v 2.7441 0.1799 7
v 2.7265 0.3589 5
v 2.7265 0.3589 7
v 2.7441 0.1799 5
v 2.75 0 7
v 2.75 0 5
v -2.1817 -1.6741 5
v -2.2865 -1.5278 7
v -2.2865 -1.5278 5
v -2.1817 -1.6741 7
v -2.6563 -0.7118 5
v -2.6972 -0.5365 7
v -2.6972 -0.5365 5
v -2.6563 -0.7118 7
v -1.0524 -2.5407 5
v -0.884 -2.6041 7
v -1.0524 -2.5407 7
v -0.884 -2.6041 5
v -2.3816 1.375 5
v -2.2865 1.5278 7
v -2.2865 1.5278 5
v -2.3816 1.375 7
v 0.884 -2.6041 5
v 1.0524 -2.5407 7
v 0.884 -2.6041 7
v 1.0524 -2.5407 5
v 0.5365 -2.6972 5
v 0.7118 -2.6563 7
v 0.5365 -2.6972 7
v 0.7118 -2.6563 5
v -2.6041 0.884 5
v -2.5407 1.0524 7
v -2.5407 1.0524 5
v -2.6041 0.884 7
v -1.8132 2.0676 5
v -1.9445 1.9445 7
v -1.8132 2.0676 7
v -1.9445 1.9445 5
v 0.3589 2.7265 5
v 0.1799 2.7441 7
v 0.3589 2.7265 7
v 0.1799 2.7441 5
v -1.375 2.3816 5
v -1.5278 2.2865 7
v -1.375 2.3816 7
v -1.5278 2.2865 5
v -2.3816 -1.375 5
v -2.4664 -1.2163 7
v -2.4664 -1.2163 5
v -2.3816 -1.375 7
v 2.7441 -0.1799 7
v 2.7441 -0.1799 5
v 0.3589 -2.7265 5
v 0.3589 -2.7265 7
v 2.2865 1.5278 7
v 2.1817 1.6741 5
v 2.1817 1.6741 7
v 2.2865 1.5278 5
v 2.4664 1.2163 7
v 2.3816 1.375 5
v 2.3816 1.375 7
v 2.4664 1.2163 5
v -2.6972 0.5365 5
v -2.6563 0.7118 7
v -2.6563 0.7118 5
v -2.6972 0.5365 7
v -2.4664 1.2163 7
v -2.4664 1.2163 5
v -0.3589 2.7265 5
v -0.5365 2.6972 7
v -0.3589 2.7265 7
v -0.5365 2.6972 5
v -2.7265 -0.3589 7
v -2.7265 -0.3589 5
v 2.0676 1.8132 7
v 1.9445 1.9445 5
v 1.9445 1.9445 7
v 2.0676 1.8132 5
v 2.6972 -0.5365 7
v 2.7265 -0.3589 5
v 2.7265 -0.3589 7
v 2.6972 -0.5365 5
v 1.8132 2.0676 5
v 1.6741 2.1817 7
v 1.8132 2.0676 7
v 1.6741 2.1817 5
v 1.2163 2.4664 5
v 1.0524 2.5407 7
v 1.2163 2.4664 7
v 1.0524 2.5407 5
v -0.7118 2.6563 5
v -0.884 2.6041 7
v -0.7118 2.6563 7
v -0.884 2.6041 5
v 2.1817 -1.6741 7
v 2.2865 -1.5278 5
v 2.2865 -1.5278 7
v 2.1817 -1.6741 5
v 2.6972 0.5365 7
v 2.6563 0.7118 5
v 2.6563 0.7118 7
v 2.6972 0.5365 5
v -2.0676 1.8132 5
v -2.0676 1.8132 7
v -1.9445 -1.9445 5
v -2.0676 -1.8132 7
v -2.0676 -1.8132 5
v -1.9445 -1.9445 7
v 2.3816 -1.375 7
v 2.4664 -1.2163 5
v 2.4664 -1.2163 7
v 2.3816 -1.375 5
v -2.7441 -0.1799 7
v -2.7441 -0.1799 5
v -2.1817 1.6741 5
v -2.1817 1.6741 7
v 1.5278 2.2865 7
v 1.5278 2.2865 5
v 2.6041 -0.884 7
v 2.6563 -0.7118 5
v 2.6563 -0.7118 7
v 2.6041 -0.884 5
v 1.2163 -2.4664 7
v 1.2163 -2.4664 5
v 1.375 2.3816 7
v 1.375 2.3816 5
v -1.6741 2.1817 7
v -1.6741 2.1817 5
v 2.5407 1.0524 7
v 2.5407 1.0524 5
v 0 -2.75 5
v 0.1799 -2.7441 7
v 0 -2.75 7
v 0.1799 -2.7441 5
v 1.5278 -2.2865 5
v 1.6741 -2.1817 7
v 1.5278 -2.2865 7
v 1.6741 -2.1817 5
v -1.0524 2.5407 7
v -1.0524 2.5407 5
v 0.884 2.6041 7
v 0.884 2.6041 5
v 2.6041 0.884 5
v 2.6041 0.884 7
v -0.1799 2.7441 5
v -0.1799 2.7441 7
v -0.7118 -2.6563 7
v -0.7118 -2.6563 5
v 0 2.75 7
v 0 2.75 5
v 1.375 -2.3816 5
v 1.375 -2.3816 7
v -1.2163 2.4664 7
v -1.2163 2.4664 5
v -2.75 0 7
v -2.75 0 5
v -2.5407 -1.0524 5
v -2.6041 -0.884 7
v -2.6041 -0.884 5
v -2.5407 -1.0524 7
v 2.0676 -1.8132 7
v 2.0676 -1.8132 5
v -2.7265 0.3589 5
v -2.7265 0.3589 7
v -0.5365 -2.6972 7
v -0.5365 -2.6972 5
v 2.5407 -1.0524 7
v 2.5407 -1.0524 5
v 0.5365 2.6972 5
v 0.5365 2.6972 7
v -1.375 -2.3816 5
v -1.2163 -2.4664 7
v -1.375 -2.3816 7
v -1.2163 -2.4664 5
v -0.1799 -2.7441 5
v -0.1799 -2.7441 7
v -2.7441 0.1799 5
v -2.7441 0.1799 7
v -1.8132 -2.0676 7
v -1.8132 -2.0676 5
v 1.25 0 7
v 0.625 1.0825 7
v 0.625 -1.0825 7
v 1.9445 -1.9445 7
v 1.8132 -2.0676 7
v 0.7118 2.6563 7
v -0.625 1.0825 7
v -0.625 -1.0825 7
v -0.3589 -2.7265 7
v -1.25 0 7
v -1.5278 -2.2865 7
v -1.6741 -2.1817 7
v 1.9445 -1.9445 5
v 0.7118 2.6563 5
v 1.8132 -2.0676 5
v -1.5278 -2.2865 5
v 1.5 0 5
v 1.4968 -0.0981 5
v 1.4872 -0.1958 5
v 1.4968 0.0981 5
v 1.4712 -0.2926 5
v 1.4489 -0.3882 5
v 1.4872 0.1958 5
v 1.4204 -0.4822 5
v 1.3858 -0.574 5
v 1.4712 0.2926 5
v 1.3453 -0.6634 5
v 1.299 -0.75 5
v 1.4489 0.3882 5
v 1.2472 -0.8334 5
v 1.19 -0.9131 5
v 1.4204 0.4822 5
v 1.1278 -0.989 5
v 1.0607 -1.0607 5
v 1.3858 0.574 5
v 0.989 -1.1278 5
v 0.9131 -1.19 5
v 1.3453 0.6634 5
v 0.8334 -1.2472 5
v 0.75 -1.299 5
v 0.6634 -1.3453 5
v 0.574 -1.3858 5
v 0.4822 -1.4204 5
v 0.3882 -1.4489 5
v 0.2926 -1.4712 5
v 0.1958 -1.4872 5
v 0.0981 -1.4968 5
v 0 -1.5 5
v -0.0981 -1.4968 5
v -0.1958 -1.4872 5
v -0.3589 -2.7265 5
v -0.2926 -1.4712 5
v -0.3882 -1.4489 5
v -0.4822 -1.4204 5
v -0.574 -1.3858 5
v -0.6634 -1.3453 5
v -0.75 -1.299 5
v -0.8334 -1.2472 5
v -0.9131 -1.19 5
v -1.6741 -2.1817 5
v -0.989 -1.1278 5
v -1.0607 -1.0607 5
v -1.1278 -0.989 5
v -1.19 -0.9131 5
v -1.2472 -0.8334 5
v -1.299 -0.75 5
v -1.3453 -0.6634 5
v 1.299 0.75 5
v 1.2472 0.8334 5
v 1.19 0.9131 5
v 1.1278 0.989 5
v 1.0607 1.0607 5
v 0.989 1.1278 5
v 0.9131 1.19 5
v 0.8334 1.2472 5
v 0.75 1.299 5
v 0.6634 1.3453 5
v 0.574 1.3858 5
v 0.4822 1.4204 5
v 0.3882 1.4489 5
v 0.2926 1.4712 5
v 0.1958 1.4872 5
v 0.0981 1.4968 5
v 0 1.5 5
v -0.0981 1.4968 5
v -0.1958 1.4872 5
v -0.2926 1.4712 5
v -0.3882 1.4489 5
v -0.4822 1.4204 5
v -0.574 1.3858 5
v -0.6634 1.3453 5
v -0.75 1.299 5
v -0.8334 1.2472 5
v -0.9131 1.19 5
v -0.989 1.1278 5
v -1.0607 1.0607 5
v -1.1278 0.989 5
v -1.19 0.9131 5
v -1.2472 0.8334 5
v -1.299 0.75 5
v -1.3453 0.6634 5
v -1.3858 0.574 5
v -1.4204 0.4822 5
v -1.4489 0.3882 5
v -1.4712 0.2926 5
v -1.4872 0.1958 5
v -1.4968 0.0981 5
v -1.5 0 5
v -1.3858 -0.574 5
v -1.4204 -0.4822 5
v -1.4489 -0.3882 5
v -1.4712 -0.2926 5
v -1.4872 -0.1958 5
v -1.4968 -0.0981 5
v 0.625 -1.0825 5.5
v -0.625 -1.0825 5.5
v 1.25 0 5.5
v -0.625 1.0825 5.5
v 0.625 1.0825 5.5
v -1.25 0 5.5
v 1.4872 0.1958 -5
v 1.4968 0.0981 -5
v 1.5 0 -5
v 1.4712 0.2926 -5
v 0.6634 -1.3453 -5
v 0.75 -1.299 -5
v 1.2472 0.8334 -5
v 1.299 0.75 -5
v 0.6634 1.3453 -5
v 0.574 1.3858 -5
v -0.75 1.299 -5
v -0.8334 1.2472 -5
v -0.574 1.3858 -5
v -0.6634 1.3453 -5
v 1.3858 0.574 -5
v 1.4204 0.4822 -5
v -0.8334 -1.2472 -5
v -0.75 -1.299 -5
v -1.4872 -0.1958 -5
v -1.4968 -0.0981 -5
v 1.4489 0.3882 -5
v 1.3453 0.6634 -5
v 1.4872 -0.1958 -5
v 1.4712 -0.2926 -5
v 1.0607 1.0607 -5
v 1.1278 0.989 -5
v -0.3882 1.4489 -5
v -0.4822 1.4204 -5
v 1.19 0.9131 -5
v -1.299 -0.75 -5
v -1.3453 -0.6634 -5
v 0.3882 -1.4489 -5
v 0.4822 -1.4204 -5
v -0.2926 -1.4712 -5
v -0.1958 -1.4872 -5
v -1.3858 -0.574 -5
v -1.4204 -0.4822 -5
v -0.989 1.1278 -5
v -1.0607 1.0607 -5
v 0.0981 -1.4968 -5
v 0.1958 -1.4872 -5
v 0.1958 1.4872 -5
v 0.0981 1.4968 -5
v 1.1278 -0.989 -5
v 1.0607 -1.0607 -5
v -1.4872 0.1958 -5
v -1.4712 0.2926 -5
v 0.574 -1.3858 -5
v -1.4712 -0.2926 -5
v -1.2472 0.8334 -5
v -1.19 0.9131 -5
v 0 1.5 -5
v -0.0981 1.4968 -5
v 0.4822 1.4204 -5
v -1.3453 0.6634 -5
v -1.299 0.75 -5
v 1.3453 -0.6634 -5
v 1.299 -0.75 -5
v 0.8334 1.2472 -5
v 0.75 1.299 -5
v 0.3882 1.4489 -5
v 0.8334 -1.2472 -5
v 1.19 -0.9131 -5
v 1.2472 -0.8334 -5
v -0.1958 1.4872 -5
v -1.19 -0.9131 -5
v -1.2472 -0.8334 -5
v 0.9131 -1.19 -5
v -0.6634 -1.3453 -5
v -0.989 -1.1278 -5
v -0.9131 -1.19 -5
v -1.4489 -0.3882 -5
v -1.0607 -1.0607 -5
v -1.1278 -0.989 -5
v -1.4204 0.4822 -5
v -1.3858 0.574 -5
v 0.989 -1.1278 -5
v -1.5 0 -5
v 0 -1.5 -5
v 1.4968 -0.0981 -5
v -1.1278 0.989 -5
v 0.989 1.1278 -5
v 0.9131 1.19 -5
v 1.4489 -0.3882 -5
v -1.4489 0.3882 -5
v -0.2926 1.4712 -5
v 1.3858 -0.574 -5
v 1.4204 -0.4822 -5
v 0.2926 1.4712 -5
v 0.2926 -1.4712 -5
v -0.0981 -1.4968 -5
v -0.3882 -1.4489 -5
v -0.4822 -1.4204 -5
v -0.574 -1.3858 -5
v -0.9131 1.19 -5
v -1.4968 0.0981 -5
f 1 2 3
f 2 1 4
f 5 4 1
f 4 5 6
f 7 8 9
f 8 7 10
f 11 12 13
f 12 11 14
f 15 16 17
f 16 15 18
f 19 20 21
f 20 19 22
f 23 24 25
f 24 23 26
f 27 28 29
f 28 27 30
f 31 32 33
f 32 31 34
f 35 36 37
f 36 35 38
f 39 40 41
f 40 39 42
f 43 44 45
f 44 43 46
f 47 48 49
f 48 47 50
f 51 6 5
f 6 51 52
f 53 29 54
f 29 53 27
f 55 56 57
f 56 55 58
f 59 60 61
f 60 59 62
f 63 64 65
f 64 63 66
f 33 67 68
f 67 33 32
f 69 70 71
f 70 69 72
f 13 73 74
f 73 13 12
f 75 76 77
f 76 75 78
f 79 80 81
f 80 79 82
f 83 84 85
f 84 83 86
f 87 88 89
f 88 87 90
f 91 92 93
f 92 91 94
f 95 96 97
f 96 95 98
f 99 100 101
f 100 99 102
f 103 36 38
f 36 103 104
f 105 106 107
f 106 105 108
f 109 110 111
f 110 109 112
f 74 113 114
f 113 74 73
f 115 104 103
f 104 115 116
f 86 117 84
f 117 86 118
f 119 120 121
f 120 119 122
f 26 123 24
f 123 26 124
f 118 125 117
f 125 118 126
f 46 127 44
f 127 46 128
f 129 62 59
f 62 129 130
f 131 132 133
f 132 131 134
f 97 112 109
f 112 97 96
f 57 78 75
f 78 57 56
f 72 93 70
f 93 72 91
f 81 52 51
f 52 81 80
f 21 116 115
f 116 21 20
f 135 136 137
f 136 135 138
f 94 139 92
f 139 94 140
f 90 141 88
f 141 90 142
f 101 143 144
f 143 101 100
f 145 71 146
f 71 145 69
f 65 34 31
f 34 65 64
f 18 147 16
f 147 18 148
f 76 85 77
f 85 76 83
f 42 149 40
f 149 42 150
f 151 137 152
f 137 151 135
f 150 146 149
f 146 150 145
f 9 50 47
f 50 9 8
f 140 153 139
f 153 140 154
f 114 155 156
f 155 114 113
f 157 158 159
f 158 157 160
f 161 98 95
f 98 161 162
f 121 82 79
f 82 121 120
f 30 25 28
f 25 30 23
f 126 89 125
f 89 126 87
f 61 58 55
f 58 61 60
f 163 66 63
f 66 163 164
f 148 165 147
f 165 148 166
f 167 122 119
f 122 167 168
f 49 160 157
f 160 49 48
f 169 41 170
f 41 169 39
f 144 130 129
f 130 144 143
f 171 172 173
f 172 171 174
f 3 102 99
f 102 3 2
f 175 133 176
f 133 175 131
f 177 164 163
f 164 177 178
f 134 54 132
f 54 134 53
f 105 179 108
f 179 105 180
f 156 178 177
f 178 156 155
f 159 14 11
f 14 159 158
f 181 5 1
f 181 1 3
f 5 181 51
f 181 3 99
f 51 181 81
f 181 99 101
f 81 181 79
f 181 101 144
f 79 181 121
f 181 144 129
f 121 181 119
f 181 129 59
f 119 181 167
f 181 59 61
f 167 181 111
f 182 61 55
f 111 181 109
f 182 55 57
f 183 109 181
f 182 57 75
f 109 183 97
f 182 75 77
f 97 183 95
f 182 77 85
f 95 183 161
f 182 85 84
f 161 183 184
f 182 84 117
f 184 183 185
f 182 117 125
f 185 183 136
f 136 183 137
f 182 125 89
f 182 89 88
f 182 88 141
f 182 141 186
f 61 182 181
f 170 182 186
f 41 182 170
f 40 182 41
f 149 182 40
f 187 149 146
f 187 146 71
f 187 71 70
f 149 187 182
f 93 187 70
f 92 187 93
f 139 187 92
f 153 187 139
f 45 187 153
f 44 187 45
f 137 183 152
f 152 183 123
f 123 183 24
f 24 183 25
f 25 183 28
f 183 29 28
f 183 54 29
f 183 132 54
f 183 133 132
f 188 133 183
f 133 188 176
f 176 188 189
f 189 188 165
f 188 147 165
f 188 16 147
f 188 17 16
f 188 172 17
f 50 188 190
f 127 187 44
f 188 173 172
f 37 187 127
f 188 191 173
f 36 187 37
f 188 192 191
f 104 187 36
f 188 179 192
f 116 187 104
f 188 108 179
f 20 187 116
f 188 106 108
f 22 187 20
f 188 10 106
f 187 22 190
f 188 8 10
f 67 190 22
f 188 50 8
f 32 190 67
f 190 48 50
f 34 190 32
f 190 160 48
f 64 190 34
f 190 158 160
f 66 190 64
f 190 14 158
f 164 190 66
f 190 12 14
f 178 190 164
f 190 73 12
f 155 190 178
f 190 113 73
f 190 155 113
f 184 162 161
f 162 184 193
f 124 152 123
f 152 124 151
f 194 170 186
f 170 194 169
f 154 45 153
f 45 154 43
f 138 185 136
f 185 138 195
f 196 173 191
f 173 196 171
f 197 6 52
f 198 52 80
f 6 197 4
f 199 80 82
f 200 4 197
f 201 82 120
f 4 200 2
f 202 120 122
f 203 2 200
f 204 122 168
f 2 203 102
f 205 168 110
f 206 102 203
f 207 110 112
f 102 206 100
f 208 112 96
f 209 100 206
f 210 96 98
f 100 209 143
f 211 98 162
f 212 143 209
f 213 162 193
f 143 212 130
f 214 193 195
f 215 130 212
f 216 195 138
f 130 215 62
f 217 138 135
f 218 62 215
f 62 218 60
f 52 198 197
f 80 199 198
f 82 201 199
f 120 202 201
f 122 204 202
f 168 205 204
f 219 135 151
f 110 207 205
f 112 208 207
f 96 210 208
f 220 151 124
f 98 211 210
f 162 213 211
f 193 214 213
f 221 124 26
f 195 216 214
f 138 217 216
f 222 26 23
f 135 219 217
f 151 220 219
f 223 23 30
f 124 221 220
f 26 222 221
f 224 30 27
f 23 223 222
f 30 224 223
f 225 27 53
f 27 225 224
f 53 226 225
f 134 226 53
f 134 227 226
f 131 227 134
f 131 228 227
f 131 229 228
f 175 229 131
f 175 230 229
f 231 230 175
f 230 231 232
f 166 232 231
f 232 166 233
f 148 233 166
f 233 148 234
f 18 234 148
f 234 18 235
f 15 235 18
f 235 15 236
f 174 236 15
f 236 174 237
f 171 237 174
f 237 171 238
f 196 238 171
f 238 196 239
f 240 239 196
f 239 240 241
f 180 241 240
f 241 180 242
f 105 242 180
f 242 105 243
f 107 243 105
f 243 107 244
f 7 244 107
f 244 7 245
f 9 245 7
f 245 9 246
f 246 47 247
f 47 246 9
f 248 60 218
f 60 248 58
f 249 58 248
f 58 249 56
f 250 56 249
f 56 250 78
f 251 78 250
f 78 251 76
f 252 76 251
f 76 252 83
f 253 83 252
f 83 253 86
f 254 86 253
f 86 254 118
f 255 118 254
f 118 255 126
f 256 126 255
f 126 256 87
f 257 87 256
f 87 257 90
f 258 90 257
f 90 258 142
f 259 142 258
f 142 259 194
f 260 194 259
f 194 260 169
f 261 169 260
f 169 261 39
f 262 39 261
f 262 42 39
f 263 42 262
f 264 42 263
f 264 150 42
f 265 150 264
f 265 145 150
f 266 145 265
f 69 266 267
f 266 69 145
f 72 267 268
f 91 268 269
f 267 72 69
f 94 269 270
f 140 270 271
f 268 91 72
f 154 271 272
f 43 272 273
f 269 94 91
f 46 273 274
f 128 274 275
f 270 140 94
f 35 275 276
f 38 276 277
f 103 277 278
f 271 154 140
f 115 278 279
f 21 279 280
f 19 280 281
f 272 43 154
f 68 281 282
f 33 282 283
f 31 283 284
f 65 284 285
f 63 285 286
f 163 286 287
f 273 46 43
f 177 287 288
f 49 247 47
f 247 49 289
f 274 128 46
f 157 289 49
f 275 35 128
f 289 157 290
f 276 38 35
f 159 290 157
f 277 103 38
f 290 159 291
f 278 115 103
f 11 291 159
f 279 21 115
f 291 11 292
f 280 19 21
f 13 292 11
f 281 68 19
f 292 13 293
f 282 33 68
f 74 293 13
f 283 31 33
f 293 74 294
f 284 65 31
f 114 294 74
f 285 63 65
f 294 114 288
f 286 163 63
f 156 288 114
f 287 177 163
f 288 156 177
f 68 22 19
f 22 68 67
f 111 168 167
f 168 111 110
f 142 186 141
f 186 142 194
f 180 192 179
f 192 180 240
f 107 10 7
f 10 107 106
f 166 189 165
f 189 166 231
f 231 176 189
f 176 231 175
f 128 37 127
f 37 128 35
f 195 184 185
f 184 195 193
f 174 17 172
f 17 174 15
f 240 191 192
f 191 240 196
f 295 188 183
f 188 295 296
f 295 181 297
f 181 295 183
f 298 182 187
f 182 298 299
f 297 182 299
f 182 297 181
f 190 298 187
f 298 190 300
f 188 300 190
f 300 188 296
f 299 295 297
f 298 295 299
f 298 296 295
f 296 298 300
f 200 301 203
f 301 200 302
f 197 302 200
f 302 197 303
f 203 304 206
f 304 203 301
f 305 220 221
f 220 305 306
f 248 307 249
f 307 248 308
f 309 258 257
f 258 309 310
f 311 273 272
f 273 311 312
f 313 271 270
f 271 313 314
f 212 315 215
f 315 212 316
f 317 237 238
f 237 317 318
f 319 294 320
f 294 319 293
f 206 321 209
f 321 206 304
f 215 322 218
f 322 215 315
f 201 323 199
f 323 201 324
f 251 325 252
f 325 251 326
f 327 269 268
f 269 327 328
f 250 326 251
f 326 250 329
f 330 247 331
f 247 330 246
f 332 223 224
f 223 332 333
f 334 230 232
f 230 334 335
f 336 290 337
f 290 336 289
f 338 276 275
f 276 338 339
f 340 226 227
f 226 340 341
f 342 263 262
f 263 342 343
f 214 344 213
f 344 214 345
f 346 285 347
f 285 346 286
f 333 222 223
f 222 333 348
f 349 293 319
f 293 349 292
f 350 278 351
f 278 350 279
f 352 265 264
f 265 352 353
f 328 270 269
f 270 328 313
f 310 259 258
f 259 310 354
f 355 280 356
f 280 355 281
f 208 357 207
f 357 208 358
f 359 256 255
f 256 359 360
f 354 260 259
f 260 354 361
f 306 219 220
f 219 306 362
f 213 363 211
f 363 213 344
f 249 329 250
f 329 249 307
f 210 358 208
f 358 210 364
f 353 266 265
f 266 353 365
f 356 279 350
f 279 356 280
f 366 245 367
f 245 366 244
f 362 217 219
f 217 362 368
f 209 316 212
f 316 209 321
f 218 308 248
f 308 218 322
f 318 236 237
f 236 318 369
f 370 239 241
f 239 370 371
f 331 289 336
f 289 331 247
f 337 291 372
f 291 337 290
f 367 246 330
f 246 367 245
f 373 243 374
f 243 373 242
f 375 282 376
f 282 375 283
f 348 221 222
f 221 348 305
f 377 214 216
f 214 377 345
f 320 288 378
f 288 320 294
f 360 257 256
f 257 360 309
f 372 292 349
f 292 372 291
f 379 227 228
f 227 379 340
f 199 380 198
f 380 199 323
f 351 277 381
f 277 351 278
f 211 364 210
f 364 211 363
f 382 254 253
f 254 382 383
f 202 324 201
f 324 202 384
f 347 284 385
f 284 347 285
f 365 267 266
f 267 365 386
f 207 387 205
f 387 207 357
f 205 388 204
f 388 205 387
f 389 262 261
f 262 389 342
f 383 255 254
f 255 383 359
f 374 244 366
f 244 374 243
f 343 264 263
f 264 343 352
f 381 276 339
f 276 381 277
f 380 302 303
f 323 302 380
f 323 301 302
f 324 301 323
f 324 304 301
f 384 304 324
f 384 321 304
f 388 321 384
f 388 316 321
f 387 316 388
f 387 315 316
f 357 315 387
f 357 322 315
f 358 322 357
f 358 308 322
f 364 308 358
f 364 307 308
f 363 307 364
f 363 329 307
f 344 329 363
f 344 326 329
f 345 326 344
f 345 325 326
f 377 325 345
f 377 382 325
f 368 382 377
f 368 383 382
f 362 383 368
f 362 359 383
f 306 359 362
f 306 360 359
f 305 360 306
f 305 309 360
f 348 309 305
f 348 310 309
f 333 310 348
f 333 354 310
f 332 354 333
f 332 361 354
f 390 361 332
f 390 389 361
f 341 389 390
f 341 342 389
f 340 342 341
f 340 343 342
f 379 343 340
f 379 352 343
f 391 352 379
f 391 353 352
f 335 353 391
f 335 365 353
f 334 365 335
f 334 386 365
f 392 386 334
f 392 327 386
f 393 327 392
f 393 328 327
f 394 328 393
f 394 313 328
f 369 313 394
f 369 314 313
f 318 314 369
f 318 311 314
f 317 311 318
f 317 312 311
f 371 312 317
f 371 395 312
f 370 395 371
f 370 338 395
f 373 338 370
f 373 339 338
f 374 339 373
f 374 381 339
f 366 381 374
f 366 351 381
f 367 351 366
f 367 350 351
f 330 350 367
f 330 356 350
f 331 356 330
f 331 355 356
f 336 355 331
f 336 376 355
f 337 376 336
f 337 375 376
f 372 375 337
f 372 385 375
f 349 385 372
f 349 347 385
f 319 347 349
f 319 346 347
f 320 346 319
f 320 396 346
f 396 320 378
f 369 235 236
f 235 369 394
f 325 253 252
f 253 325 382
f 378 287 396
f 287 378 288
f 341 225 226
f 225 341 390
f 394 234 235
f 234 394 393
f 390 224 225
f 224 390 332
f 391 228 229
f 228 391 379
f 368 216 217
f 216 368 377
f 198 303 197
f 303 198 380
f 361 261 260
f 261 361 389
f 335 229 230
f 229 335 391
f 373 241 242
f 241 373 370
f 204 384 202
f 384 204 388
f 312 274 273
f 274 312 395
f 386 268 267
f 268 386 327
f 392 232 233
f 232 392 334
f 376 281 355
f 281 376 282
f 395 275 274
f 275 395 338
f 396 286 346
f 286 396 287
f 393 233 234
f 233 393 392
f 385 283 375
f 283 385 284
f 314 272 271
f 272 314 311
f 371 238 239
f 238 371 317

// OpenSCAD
$fn=96;

module socket_head_cap_screw(d=3.0, L=10.0, head_d=5.5, head_h=2.0, socket_d=2.5, socket_depth=1.5) {
    union() {
        translate([0,0,-L/2])
            cylinder(d=d, h=L, $fn=96);

        translate([0,0,L/2])
            difference() {
                cylinder(d=head_d, h=head_h, $fn=96);
                translate([0,0,head_h - socket_depth])
                    cylinder(d=socket_d, h=socket_depth + 0.2, $fn=6);
            }
    }
}

socket_head_cap_screw(d=3.0, L=10.0, head_d=5.5, head_h=2.0, socket_d=2.5, socket_depth=1.5);
